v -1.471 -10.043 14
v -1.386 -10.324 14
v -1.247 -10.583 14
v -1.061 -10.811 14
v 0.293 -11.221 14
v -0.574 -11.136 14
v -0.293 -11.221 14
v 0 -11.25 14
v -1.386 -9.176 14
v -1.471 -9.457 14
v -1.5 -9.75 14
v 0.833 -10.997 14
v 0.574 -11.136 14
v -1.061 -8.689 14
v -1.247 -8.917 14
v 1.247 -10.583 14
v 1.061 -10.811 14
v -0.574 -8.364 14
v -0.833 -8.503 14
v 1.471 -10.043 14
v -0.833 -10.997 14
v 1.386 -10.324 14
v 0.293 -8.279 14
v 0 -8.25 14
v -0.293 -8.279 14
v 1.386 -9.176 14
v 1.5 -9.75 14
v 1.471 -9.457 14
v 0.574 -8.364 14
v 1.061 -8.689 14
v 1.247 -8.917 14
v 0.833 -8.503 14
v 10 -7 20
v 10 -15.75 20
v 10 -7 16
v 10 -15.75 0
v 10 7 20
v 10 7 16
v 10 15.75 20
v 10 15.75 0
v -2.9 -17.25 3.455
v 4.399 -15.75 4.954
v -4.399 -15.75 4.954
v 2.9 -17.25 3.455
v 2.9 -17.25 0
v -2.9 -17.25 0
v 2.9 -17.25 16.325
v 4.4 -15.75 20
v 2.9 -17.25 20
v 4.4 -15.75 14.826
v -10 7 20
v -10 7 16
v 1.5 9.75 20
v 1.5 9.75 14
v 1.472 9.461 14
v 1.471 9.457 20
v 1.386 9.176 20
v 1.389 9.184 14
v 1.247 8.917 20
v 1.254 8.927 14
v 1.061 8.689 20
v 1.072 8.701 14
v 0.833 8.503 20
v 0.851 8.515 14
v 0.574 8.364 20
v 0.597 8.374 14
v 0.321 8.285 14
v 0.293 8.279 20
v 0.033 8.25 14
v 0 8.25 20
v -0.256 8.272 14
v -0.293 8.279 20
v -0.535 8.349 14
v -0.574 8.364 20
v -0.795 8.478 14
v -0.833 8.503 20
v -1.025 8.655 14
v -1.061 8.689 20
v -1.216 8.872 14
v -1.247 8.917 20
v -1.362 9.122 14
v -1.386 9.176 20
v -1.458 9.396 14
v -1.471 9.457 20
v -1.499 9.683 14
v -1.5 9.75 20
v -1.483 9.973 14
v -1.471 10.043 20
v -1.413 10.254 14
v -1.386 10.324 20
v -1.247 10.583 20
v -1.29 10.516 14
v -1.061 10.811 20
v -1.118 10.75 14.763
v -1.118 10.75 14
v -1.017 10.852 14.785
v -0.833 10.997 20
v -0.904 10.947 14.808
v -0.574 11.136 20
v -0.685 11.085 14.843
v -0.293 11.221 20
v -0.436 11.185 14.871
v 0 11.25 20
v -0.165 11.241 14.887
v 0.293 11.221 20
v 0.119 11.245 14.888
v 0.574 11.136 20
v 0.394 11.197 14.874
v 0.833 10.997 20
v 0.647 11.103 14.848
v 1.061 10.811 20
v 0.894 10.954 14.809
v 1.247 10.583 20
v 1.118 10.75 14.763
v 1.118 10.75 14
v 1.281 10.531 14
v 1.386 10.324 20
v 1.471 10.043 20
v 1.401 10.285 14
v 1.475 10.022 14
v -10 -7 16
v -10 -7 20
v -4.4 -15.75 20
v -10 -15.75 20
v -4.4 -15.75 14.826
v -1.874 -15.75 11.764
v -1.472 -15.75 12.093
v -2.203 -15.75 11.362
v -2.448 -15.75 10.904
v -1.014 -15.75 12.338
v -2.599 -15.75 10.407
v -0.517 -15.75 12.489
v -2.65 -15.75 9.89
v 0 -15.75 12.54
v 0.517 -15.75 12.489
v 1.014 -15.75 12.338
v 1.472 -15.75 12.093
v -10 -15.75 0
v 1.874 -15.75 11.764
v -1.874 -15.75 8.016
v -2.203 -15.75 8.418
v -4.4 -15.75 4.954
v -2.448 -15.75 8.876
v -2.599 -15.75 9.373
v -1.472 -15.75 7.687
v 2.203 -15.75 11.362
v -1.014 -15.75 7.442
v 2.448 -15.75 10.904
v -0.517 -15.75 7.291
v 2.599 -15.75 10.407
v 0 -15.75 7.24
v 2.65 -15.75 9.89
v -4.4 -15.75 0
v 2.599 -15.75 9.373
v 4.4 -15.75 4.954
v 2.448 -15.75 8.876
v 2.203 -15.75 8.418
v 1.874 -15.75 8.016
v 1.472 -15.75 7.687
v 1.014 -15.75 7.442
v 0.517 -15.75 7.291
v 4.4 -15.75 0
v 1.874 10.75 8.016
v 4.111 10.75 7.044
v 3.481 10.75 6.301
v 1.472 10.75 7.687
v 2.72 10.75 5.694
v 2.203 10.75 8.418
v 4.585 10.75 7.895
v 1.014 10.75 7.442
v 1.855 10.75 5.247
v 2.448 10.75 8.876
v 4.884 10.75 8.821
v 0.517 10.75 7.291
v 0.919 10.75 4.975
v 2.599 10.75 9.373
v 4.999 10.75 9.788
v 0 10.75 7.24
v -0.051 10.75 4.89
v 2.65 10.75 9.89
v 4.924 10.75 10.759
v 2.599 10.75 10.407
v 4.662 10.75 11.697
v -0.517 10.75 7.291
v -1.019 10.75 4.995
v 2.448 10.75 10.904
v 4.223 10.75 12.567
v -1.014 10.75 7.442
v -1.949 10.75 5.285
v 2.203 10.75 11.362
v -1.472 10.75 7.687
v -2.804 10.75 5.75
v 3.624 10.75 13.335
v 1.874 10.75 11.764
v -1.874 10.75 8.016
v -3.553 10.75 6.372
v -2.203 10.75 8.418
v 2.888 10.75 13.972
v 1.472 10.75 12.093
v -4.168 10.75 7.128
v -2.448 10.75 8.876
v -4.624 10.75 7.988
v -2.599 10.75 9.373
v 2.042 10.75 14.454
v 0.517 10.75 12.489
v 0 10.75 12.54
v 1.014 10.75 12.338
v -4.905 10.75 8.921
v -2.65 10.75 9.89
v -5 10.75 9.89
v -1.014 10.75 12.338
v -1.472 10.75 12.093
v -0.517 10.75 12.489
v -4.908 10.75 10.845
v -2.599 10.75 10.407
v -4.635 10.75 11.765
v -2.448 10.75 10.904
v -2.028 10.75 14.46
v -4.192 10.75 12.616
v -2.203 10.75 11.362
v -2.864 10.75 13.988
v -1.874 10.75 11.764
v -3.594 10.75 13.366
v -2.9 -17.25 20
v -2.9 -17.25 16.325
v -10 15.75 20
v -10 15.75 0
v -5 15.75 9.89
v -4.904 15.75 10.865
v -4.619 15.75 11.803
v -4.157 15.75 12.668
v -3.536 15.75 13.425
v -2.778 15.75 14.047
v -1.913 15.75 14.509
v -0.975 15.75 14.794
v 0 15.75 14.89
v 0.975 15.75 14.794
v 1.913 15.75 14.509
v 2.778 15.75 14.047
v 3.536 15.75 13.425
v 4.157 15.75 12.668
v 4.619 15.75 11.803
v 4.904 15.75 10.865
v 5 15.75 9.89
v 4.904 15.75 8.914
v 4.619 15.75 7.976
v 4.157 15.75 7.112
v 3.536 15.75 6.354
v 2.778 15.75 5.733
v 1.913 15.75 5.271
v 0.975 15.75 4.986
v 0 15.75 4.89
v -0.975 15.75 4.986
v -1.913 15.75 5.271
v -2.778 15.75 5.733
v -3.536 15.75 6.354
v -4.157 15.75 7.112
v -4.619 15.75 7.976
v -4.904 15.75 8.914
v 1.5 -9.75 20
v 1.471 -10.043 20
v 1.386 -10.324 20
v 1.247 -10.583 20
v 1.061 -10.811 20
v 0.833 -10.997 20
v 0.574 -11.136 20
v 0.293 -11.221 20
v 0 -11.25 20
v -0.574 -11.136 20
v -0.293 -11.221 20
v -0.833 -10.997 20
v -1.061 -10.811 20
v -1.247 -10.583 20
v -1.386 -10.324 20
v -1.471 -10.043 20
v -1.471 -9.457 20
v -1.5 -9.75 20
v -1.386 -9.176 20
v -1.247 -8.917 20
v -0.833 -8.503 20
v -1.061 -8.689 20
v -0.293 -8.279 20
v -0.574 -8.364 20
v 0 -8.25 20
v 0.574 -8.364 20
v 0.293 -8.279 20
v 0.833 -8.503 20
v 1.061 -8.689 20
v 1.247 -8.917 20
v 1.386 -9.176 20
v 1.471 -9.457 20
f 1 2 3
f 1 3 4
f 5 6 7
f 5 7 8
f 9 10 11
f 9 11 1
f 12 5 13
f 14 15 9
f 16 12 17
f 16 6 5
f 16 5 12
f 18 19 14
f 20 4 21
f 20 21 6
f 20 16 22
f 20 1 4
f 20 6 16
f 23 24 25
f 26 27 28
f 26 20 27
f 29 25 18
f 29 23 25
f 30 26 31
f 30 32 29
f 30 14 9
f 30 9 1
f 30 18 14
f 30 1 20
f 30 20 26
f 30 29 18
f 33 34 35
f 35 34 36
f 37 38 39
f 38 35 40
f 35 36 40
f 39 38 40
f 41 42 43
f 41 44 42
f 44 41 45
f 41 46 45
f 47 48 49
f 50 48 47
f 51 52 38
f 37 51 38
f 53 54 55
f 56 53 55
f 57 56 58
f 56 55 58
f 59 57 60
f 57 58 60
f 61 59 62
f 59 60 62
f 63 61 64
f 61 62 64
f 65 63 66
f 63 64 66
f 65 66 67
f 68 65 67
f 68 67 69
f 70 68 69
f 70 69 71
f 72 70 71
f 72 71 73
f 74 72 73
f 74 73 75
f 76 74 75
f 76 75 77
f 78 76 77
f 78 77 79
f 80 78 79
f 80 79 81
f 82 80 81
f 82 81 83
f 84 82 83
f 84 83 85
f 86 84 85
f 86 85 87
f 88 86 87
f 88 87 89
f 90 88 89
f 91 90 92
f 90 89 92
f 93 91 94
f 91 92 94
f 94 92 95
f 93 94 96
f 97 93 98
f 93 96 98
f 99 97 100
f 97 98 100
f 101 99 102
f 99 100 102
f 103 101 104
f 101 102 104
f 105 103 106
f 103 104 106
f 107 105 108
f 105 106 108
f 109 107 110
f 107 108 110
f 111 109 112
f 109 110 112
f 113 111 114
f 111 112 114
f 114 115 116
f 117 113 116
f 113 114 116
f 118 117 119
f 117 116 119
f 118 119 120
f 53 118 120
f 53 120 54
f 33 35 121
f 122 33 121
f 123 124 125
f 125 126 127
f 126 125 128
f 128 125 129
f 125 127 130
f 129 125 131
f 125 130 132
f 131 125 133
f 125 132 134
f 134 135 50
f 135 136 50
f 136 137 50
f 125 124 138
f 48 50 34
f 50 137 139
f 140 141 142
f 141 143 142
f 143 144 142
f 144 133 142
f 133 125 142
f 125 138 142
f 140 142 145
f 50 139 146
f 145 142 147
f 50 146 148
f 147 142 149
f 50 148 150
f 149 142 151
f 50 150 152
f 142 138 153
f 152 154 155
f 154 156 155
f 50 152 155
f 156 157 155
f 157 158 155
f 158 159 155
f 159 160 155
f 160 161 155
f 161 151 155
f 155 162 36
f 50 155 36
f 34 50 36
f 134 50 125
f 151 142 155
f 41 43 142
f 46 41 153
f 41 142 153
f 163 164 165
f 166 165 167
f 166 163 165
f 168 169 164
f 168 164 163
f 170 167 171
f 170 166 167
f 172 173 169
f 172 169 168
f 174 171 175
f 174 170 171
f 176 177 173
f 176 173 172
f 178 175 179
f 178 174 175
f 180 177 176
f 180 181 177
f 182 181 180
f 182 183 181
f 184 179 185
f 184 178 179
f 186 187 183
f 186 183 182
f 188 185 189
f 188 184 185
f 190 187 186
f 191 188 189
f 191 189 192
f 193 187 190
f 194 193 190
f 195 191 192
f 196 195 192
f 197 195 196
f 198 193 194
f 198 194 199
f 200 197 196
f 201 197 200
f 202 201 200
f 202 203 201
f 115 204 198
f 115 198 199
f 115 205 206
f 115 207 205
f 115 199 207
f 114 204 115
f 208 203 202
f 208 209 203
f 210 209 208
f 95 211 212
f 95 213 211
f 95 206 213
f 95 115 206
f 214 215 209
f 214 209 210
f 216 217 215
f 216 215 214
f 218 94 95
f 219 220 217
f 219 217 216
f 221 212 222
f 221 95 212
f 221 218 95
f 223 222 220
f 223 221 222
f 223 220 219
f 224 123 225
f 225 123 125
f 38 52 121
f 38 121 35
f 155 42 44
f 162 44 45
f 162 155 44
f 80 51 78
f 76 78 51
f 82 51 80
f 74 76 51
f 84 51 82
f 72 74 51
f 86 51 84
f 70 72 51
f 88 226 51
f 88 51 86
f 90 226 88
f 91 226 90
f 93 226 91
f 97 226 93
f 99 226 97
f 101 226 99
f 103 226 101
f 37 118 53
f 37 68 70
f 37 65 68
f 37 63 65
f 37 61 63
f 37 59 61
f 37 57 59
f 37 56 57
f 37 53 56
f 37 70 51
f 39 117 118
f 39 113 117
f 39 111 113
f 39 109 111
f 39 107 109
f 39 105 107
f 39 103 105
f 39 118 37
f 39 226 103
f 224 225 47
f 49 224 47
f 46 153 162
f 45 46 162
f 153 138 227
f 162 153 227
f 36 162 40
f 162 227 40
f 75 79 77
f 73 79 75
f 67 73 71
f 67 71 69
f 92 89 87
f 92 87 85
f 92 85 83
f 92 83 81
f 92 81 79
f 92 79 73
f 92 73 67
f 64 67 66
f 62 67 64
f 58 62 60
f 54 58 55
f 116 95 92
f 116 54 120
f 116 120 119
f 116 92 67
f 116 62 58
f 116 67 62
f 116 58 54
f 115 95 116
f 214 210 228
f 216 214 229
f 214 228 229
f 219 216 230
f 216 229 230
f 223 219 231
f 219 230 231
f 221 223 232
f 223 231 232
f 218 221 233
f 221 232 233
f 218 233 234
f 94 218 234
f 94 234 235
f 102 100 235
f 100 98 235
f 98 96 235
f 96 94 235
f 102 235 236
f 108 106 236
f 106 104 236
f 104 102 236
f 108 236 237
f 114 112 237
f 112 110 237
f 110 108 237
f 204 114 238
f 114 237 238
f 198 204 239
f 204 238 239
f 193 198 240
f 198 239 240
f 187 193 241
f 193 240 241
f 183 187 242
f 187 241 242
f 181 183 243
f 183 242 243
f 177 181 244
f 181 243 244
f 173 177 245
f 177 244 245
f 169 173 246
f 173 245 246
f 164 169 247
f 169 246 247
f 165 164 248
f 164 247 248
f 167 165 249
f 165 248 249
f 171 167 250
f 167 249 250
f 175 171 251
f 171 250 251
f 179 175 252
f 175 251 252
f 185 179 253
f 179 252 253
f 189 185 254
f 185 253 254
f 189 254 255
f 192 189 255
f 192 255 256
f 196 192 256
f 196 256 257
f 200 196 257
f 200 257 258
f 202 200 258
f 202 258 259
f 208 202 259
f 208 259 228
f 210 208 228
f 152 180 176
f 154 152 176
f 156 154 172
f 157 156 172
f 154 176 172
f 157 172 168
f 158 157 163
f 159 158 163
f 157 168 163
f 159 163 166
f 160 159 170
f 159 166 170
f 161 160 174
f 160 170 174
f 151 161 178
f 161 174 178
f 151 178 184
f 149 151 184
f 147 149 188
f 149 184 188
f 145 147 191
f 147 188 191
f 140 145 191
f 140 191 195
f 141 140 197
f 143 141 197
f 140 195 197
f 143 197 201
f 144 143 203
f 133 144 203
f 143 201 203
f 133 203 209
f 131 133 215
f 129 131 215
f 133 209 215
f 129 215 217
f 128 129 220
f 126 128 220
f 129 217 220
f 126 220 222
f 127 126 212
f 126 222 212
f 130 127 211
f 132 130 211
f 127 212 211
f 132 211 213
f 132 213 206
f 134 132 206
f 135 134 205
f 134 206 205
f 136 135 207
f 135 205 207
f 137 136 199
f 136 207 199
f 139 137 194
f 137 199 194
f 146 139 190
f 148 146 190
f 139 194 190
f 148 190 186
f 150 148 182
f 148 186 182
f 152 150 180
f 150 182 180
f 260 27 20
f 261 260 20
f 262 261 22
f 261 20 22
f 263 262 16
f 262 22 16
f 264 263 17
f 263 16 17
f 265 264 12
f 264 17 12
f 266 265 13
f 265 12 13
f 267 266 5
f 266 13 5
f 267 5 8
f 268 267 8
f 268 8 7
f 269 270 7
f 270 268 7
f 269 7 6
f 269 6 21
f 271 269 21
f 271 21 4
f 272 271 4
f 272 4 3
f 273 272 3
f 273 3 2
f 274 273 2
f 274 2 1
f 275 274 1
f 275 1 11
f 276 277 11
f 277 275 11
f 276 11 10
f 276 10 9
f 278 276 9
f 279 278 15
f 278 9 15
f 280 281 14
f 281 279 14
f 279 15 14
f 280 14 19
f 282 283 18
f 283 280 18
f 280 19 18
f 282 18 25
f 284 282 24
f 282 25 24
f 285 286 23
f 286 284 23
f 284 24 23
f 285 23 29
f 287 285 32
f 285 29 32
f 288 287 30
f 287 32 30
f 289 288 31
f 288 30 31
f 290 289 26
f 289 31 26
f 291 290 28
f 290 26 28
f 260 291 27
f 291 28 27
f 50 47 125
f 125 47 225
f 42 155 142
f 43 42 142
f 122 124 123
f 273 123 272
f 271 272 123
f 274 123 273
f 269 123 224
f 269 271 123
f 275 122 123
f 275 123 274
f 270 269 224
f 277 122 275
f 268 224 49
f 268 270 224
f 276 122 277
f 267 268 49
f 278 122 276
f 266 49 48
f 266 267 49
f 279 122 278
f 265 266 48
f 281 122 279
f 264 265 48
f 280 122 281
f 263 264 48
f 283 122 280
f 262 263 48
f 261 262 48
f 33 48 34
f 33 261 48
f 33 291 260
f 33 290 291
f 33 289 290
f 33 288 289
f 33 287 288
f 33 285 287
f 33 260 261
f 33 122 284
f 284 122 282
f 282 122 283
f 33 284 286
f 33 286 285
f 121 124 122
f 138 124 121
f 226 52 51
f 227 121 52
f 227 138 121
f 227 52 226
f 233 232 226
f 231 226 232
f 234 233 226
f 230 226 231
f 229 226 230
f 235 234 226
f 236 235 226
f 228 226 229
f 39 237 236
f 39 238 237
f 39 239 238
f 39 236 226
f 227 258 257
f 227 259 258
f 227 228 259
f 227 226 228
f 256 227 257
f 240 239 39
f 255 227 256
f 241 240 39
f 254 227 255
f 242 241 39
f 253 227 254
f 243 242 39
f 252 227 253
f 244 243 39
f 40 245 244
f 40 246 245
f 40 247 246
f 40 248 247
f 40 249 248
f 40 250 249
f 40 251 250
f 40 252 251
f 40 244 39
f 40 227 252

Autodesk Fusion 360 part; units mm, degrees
sketch "Sketch1" plane through (0, 0, 0) normal (0, 0, 1) x (1, 0, 0)
  line L0 (10, -7) -> (-10, -7)
  line L1 (-10, 7) -> (10, 7)
  line L2 (5, 7) -> (-5, -7) construction
  line L3 (5, -7) -> (-5, 7) construction
  line L4 (10, 0) -> (-10, 0) construction
  line L5 (0, -9.75) -> (0, 9.75) construction
  circle A0 centre (0, -9.75) radius 1.5
  circle A1 centre (0, 9.75) radius 1.5
  line L6 (-10, -15.75) -> (10, -15.75)
  line L7 (-10, 15.75) -> (10, 15.75)
  line L8 (-10, -15.75) -> (-10, 15.75)
  line L9 (10, -15.75) -> (10, 15.75)
  dimension "d1" = 14
  dimension "d2" = 10
  dimension "d3" = 3
  dimension "d4" = 3
  dimension "d5" = 19.5
  dimension "d6" = 20
extrude "Extrude1" add sketch "Sketch1" along normal blind 20 contours L0 L6 L8 L9 | L1 L7 L8 L9 makes body 1 at (-3.3333, -15.75, 6.6667) makes body 2 at (-3.3333, 7, 6.6667)
extrude "Extrude2" add sketch "Sketch1" along normal blind 16 contours L0 L1 L8 L9 bodies 1 2
sketch "Sketch2" plane through (0, -15.75, 0) normal (0, -1, 0) x (1, 0, 0)
  line L0 (-10, 0) -> (10, 0)
  line L1 (10, 0) -> (10, 20)
  line L2 (10, 20) -> (-10, 20)
  line L3 (-10, 20) -> (-10, 0)
  circle A0 centre (0, 9.8899) radius 2.65
  dimension "d11" = 5.3
extrude "Extrude3" add sketch "Sketch1" along normal blind 14 contours A0 | A1 bodies 1
extrude "Extrude4" cut sketch "Sketch2" against normal blind 31.5 contours A0 bodies 1
sketch "Sketch3" plane through (0, 0, 0) normal (0, 0, 1) x (1, 0, 0)
  line L0 (-10, -15.75) -> (-10, 15.75)
  line L1 (10, -15.75) -> (10, 15.75)
  line L2 (-2.9, -17.25) -> (2.9, -17.25)
  line L3 (2.9, -15.75) -> (2.9, -17.25)
  line L4 (-2.9, -15.75) -> (-2.9, -17.25)
  line L5 (-10, -15.75) -> (-2.9, -15.75)
  line L6 (2.9, -15.75) -> (10, -15.75)
  line L7 (-2.9, -15.75) -> (2.9, -15.75)
  line L8 (-10, -15.75) -> (10, -15.75)
  line L9 (0, 0) -> (0, -34.5) construction
  dimension "d23" = 1.5
  dimension "d27" = 5.8
extrude "Extrude5" add sketch "Sketch3" along normal blind 20 bodies 1
extrude "Extrude6" cut sketch "Sketch2" along normal blind 3 contours A0 bodies 1
chamfer "Chamfer1" distance 1.5 angle 45 1 edges at (2.9, -15.75, 10) on bodies 1
chamfer "Chamfer1" distance 1.5 angle 45 1 edges at (-2.9, -15.75, 10) on bodies 1
sketch "Sketch4" plane through (0, 15.75, 0) normal (0, 1, 0) x (-1, 0, 0)
  circle A0 centre (0, 9.8899) radius 2.65
  line L0 (-10, 0) -> (10, 0)
  line L1 (10, 0) -> (10, 20)
  line L2 (10, 20) -> (-10, 20)
  line L3 (-10, 20) -> (-10, 0)
  circle A1 centre (0, 9.8899) radius 5
  dimension "d24" = 10
extrude "Extrude7" cut sketch "Sketch4" against normal blind 5 contours A1 bodies 1
sketch "Sketch5" plane through (0, 0, 0) normal (0, 0, 1) x (1, 0, 0)
  line L0 (2.65, -17.25) -> (-2.65, -17.25)
  line L1 (2.65, -17.25) -> (-2.65, -17.25)
sketch "Sketch6" plane through (0, -15.75, 0) normal (0, -1, 0) x (1, 0, 0)
  line L0 (4.7787, 4.9544) -> (-4.7787, 4.9544)
  line L1 (-4.7787, 4.9544) -> (-4.7787, 16.3254)
  line L2 (-4.7787, 16.3254) -> (4.7787, 16.3254)
  line L3 (4.7787, 16.3254) -> (4.7787, 4.9544)
  point P0 (0, 9.8899)
  point P1 (0, 9.8899)
extrude "Extrude8" cut sketch "Sketch6" along normal blind 1.5 bodies 1
chamfer "Chamfer2" distance 1.5 angle 45 1 edges at (0, -15.75, 16.3254) on bodies 1
chamfer "Chamfer3" distance 1.5 angle 45 1 edges at (0, -17.25, 4.9544) on bodies 1
